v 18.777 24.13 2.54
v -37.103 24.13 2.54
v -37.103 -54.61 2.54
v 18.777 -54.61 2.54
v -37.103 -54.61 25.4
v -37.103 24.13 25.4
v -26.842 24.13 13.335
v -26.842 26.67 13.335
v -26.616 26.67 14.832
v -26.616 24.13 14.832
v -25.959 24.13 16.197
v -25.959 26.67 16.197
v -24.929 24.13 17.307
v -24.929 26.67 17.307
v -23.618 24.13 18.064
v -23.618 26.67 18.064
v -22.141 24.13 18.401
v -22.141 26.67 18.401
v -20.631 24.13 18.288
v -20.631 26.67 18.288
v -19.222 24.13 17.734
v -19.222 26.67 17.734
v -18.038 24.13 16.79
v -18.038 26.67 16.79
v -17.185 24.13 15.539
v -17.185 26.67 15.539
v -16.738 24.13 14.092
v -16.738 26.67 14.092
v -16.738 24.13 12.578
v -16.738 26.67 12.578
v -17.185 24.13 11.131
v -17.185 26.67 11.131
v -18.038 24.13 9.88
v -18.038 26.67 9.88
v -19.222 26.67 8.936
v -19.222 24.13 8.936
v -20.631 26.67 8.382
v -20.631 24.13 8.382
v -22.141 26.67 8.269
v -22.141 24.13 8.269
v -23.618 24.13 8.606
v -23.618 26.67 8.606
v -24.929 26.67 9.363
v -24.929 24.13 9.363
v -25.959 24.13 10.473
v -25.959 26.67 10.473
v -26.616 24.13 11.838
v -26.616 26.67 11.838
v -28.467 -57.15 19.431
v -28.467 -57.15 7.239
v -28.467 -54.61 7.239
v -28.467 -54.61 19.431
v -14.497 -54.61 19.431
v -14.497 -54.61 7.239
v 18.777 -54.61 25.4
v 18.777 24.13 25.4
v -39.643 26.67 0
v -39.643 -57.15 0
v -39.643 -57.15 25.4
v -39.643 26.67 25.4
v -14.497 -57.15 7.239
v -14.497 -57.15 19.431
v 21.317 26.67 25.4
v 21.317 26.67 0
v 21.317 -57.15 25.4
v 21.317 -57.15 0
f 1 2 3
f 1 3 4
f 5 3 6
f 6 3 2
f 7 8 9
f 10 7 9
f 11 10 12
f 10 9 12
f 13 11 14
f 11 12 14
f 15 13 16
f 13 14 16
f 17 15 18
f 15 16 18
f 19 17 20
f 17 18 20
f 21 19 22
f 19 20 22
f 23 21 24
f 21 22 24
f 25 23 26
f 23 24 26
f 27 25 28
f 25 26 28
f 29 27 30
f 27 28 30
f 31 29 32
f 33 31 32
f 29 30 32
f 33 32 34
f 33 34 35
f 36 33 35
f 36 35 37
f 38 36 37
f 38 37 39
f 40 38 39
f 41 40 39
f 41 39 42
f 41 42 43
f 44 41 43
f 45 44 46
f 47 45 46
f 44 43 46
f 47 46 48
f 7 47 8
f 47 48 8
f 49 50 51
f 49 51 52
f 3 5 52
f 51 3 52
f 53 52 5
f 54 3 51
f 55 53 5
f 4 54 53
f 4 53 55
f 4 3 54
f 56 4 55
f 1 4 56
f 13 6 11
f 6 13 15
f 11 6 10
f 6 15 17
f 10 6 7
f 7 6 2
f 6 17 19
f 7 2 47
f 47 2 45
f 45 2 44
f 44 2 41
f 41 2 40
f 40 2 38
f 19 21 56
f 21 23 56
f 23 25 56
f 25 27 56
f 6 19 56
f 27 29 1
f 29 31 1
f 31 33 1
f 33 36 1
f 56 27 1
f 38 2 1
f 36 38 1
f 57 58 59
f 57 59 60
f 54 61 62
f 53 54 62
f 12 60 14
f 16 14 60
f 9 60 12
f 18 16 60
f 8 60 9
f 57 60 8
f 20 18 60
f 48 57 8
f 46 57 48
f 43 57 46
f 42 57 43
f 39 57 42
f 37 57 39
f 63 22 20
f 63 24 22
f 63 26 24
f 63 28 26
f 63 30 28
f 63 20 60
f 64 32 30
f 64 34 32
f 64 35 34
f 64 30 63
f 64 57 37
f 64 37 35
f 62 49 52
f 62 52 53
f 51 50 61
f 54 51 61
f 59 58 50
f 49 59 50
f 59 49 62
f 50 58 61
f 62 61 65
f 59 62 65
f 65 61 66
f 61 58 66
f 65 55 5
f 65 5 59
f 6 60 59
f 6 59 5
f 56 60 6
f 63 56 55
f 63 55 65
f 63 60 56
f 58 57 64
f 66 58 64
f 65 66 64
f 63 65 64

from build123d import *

# Parameters (mm, degrees)
F0_W     = 60.96
F0_H     = 83.82
F1_DEPTH = 25.4
F2_T     = -2.54
F3_W     = 13.97
F3_H     = 12.192
F4_DEPTH = 2.54
F5_R     = 5.08
F6_DEPTH = 2.54


with BuildPart() as f1:
    # F0 (on Top) → F1 (new body)
    with BuildSketch(Plane.XY):
        with Locations((-9.163326, -15.24)):
            Rectangle(F0_W, F0_H)
    extrude(amount=F1_DEPTH)

    # F2
    f2_openings = [f1.faces().sort_by_distance(p)[0] for p in [
        (-9.163326, -15.24, 25.4),
    ]]
    offset(amount=F2_T, openings=f2_openings)

    # F3 (on face) → F4 (cut, through all)
    with BuildSketch(Plane.XZ.offset(57.15)):
        with Locations((-21.482326, 13.335)):
            Rectangle(F3_W, F3_H)
    extrude(amount=-F4_DEPTH, mode=Mode.SUBTRACT)

    # F5 (on face) → F6 (cut, through all)
    with BuildSketch(Plane(origin=(0, 26.67, 0), x_dir=(-1, 0, 0), z_dir=(0, 1, 0))):
        with Locations((21.761726, 13.335)):
            Circle(F5_R)
    extrude(amount=-F6_DEPTH, mode=Mode.SUBTRACT)


solid = f1.part
